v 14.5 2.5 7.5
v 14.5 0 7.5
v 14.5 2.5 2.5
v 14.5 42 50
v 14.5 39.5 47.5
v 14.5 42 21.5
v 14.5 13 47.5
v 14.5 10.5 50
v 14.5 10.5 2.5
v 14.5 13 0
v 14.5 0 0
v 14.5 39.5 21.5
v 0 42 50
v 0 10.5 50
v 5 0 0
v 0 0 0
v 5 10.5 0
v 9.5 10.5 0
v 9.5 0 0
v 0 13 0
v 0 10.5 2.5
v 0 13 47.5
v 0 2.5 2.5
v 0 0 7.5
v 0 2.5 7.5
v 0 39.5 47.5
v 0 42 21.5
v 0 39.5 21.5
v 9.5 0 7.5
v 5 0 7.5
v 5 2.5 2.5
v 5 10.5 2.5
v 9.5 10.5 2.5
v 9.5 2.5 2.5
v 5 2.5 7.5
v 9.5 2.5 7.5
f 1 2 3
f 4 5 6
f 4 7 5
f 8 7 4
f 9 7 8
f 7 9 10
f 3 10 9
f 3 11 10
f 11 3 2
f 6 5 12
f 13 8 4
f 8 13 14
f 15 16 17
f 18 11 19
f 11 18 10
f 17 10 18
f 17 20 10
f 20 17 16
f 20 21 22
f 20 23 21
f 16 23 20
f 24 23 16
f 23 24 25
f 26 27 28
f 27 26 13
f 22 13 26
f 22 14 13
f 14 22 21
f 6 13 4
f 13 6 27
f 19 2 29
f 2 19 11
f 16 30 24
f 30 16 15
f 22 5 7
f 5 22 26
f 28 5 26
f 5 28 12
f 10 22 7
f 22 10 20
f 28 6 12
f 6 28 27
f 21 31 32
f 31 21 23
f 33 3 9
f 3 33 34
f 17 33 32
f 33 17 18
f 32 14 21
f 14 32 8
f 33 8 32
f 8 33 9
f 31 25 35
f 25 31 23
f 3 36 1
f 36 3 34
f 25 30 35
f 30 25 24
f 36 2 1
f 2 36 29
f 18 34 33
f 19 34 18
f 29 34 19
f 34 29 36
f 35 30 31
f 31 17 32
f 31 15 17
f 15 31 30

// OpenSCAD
/*
     +-----+  ^
     |     |  |
     |<--->|  |
     |  2     |
     |        |
  1  |        | hook_height
|<-->|        |
|    |        |
+----+        v

1 = cable_depth
2 = hook_depth
*/

thickness = 2.5;
hook_depth = 26.5;
hook_height = 45;
cable_diameter = 4.5;
cable_depth = 8;

difference(){
    // base shape
    cube([
        10 + cable_diameter,
        3 * thickness + cable_depth + hook_depth,
        2 * thickness + hook_height
    ]);
    
    // hook
    translate([
        -1,
        2 * thickness + cable_depth,
        -1
    ])
    cube([
        12 + cable_diameter,
        hook_depth,
        hook_height + thickness + 1
    ]);
    
    translate([
        -1,
        2 * thickness + cable_depth,
        -1
    ])
    cube([
        12 + cable_diameter,
        hook_depth + 2 * thickness,
        hook_height / 2
    ]);
    
    // cable holder
    translate([
        -1,
        thickness,
        thickness
    ])
    cube([
        12 + cable_diameter,
        cable_depth,
        hook_height + 2 * thickness
    ]);
    
    translate([
        -1,
        -1,
        thickness + 5
    ])
    cube([
        12 + cable_diameter,
        cable_depth,
        hook_height + 2 * thickness
    ]);
    
    // cable slot
    translate([
        5,
        -1,
        -1
    ])
    cube([
        cable_diameter,
        cable_depth + thickness + 1,
        hook_height
    ]);
}
